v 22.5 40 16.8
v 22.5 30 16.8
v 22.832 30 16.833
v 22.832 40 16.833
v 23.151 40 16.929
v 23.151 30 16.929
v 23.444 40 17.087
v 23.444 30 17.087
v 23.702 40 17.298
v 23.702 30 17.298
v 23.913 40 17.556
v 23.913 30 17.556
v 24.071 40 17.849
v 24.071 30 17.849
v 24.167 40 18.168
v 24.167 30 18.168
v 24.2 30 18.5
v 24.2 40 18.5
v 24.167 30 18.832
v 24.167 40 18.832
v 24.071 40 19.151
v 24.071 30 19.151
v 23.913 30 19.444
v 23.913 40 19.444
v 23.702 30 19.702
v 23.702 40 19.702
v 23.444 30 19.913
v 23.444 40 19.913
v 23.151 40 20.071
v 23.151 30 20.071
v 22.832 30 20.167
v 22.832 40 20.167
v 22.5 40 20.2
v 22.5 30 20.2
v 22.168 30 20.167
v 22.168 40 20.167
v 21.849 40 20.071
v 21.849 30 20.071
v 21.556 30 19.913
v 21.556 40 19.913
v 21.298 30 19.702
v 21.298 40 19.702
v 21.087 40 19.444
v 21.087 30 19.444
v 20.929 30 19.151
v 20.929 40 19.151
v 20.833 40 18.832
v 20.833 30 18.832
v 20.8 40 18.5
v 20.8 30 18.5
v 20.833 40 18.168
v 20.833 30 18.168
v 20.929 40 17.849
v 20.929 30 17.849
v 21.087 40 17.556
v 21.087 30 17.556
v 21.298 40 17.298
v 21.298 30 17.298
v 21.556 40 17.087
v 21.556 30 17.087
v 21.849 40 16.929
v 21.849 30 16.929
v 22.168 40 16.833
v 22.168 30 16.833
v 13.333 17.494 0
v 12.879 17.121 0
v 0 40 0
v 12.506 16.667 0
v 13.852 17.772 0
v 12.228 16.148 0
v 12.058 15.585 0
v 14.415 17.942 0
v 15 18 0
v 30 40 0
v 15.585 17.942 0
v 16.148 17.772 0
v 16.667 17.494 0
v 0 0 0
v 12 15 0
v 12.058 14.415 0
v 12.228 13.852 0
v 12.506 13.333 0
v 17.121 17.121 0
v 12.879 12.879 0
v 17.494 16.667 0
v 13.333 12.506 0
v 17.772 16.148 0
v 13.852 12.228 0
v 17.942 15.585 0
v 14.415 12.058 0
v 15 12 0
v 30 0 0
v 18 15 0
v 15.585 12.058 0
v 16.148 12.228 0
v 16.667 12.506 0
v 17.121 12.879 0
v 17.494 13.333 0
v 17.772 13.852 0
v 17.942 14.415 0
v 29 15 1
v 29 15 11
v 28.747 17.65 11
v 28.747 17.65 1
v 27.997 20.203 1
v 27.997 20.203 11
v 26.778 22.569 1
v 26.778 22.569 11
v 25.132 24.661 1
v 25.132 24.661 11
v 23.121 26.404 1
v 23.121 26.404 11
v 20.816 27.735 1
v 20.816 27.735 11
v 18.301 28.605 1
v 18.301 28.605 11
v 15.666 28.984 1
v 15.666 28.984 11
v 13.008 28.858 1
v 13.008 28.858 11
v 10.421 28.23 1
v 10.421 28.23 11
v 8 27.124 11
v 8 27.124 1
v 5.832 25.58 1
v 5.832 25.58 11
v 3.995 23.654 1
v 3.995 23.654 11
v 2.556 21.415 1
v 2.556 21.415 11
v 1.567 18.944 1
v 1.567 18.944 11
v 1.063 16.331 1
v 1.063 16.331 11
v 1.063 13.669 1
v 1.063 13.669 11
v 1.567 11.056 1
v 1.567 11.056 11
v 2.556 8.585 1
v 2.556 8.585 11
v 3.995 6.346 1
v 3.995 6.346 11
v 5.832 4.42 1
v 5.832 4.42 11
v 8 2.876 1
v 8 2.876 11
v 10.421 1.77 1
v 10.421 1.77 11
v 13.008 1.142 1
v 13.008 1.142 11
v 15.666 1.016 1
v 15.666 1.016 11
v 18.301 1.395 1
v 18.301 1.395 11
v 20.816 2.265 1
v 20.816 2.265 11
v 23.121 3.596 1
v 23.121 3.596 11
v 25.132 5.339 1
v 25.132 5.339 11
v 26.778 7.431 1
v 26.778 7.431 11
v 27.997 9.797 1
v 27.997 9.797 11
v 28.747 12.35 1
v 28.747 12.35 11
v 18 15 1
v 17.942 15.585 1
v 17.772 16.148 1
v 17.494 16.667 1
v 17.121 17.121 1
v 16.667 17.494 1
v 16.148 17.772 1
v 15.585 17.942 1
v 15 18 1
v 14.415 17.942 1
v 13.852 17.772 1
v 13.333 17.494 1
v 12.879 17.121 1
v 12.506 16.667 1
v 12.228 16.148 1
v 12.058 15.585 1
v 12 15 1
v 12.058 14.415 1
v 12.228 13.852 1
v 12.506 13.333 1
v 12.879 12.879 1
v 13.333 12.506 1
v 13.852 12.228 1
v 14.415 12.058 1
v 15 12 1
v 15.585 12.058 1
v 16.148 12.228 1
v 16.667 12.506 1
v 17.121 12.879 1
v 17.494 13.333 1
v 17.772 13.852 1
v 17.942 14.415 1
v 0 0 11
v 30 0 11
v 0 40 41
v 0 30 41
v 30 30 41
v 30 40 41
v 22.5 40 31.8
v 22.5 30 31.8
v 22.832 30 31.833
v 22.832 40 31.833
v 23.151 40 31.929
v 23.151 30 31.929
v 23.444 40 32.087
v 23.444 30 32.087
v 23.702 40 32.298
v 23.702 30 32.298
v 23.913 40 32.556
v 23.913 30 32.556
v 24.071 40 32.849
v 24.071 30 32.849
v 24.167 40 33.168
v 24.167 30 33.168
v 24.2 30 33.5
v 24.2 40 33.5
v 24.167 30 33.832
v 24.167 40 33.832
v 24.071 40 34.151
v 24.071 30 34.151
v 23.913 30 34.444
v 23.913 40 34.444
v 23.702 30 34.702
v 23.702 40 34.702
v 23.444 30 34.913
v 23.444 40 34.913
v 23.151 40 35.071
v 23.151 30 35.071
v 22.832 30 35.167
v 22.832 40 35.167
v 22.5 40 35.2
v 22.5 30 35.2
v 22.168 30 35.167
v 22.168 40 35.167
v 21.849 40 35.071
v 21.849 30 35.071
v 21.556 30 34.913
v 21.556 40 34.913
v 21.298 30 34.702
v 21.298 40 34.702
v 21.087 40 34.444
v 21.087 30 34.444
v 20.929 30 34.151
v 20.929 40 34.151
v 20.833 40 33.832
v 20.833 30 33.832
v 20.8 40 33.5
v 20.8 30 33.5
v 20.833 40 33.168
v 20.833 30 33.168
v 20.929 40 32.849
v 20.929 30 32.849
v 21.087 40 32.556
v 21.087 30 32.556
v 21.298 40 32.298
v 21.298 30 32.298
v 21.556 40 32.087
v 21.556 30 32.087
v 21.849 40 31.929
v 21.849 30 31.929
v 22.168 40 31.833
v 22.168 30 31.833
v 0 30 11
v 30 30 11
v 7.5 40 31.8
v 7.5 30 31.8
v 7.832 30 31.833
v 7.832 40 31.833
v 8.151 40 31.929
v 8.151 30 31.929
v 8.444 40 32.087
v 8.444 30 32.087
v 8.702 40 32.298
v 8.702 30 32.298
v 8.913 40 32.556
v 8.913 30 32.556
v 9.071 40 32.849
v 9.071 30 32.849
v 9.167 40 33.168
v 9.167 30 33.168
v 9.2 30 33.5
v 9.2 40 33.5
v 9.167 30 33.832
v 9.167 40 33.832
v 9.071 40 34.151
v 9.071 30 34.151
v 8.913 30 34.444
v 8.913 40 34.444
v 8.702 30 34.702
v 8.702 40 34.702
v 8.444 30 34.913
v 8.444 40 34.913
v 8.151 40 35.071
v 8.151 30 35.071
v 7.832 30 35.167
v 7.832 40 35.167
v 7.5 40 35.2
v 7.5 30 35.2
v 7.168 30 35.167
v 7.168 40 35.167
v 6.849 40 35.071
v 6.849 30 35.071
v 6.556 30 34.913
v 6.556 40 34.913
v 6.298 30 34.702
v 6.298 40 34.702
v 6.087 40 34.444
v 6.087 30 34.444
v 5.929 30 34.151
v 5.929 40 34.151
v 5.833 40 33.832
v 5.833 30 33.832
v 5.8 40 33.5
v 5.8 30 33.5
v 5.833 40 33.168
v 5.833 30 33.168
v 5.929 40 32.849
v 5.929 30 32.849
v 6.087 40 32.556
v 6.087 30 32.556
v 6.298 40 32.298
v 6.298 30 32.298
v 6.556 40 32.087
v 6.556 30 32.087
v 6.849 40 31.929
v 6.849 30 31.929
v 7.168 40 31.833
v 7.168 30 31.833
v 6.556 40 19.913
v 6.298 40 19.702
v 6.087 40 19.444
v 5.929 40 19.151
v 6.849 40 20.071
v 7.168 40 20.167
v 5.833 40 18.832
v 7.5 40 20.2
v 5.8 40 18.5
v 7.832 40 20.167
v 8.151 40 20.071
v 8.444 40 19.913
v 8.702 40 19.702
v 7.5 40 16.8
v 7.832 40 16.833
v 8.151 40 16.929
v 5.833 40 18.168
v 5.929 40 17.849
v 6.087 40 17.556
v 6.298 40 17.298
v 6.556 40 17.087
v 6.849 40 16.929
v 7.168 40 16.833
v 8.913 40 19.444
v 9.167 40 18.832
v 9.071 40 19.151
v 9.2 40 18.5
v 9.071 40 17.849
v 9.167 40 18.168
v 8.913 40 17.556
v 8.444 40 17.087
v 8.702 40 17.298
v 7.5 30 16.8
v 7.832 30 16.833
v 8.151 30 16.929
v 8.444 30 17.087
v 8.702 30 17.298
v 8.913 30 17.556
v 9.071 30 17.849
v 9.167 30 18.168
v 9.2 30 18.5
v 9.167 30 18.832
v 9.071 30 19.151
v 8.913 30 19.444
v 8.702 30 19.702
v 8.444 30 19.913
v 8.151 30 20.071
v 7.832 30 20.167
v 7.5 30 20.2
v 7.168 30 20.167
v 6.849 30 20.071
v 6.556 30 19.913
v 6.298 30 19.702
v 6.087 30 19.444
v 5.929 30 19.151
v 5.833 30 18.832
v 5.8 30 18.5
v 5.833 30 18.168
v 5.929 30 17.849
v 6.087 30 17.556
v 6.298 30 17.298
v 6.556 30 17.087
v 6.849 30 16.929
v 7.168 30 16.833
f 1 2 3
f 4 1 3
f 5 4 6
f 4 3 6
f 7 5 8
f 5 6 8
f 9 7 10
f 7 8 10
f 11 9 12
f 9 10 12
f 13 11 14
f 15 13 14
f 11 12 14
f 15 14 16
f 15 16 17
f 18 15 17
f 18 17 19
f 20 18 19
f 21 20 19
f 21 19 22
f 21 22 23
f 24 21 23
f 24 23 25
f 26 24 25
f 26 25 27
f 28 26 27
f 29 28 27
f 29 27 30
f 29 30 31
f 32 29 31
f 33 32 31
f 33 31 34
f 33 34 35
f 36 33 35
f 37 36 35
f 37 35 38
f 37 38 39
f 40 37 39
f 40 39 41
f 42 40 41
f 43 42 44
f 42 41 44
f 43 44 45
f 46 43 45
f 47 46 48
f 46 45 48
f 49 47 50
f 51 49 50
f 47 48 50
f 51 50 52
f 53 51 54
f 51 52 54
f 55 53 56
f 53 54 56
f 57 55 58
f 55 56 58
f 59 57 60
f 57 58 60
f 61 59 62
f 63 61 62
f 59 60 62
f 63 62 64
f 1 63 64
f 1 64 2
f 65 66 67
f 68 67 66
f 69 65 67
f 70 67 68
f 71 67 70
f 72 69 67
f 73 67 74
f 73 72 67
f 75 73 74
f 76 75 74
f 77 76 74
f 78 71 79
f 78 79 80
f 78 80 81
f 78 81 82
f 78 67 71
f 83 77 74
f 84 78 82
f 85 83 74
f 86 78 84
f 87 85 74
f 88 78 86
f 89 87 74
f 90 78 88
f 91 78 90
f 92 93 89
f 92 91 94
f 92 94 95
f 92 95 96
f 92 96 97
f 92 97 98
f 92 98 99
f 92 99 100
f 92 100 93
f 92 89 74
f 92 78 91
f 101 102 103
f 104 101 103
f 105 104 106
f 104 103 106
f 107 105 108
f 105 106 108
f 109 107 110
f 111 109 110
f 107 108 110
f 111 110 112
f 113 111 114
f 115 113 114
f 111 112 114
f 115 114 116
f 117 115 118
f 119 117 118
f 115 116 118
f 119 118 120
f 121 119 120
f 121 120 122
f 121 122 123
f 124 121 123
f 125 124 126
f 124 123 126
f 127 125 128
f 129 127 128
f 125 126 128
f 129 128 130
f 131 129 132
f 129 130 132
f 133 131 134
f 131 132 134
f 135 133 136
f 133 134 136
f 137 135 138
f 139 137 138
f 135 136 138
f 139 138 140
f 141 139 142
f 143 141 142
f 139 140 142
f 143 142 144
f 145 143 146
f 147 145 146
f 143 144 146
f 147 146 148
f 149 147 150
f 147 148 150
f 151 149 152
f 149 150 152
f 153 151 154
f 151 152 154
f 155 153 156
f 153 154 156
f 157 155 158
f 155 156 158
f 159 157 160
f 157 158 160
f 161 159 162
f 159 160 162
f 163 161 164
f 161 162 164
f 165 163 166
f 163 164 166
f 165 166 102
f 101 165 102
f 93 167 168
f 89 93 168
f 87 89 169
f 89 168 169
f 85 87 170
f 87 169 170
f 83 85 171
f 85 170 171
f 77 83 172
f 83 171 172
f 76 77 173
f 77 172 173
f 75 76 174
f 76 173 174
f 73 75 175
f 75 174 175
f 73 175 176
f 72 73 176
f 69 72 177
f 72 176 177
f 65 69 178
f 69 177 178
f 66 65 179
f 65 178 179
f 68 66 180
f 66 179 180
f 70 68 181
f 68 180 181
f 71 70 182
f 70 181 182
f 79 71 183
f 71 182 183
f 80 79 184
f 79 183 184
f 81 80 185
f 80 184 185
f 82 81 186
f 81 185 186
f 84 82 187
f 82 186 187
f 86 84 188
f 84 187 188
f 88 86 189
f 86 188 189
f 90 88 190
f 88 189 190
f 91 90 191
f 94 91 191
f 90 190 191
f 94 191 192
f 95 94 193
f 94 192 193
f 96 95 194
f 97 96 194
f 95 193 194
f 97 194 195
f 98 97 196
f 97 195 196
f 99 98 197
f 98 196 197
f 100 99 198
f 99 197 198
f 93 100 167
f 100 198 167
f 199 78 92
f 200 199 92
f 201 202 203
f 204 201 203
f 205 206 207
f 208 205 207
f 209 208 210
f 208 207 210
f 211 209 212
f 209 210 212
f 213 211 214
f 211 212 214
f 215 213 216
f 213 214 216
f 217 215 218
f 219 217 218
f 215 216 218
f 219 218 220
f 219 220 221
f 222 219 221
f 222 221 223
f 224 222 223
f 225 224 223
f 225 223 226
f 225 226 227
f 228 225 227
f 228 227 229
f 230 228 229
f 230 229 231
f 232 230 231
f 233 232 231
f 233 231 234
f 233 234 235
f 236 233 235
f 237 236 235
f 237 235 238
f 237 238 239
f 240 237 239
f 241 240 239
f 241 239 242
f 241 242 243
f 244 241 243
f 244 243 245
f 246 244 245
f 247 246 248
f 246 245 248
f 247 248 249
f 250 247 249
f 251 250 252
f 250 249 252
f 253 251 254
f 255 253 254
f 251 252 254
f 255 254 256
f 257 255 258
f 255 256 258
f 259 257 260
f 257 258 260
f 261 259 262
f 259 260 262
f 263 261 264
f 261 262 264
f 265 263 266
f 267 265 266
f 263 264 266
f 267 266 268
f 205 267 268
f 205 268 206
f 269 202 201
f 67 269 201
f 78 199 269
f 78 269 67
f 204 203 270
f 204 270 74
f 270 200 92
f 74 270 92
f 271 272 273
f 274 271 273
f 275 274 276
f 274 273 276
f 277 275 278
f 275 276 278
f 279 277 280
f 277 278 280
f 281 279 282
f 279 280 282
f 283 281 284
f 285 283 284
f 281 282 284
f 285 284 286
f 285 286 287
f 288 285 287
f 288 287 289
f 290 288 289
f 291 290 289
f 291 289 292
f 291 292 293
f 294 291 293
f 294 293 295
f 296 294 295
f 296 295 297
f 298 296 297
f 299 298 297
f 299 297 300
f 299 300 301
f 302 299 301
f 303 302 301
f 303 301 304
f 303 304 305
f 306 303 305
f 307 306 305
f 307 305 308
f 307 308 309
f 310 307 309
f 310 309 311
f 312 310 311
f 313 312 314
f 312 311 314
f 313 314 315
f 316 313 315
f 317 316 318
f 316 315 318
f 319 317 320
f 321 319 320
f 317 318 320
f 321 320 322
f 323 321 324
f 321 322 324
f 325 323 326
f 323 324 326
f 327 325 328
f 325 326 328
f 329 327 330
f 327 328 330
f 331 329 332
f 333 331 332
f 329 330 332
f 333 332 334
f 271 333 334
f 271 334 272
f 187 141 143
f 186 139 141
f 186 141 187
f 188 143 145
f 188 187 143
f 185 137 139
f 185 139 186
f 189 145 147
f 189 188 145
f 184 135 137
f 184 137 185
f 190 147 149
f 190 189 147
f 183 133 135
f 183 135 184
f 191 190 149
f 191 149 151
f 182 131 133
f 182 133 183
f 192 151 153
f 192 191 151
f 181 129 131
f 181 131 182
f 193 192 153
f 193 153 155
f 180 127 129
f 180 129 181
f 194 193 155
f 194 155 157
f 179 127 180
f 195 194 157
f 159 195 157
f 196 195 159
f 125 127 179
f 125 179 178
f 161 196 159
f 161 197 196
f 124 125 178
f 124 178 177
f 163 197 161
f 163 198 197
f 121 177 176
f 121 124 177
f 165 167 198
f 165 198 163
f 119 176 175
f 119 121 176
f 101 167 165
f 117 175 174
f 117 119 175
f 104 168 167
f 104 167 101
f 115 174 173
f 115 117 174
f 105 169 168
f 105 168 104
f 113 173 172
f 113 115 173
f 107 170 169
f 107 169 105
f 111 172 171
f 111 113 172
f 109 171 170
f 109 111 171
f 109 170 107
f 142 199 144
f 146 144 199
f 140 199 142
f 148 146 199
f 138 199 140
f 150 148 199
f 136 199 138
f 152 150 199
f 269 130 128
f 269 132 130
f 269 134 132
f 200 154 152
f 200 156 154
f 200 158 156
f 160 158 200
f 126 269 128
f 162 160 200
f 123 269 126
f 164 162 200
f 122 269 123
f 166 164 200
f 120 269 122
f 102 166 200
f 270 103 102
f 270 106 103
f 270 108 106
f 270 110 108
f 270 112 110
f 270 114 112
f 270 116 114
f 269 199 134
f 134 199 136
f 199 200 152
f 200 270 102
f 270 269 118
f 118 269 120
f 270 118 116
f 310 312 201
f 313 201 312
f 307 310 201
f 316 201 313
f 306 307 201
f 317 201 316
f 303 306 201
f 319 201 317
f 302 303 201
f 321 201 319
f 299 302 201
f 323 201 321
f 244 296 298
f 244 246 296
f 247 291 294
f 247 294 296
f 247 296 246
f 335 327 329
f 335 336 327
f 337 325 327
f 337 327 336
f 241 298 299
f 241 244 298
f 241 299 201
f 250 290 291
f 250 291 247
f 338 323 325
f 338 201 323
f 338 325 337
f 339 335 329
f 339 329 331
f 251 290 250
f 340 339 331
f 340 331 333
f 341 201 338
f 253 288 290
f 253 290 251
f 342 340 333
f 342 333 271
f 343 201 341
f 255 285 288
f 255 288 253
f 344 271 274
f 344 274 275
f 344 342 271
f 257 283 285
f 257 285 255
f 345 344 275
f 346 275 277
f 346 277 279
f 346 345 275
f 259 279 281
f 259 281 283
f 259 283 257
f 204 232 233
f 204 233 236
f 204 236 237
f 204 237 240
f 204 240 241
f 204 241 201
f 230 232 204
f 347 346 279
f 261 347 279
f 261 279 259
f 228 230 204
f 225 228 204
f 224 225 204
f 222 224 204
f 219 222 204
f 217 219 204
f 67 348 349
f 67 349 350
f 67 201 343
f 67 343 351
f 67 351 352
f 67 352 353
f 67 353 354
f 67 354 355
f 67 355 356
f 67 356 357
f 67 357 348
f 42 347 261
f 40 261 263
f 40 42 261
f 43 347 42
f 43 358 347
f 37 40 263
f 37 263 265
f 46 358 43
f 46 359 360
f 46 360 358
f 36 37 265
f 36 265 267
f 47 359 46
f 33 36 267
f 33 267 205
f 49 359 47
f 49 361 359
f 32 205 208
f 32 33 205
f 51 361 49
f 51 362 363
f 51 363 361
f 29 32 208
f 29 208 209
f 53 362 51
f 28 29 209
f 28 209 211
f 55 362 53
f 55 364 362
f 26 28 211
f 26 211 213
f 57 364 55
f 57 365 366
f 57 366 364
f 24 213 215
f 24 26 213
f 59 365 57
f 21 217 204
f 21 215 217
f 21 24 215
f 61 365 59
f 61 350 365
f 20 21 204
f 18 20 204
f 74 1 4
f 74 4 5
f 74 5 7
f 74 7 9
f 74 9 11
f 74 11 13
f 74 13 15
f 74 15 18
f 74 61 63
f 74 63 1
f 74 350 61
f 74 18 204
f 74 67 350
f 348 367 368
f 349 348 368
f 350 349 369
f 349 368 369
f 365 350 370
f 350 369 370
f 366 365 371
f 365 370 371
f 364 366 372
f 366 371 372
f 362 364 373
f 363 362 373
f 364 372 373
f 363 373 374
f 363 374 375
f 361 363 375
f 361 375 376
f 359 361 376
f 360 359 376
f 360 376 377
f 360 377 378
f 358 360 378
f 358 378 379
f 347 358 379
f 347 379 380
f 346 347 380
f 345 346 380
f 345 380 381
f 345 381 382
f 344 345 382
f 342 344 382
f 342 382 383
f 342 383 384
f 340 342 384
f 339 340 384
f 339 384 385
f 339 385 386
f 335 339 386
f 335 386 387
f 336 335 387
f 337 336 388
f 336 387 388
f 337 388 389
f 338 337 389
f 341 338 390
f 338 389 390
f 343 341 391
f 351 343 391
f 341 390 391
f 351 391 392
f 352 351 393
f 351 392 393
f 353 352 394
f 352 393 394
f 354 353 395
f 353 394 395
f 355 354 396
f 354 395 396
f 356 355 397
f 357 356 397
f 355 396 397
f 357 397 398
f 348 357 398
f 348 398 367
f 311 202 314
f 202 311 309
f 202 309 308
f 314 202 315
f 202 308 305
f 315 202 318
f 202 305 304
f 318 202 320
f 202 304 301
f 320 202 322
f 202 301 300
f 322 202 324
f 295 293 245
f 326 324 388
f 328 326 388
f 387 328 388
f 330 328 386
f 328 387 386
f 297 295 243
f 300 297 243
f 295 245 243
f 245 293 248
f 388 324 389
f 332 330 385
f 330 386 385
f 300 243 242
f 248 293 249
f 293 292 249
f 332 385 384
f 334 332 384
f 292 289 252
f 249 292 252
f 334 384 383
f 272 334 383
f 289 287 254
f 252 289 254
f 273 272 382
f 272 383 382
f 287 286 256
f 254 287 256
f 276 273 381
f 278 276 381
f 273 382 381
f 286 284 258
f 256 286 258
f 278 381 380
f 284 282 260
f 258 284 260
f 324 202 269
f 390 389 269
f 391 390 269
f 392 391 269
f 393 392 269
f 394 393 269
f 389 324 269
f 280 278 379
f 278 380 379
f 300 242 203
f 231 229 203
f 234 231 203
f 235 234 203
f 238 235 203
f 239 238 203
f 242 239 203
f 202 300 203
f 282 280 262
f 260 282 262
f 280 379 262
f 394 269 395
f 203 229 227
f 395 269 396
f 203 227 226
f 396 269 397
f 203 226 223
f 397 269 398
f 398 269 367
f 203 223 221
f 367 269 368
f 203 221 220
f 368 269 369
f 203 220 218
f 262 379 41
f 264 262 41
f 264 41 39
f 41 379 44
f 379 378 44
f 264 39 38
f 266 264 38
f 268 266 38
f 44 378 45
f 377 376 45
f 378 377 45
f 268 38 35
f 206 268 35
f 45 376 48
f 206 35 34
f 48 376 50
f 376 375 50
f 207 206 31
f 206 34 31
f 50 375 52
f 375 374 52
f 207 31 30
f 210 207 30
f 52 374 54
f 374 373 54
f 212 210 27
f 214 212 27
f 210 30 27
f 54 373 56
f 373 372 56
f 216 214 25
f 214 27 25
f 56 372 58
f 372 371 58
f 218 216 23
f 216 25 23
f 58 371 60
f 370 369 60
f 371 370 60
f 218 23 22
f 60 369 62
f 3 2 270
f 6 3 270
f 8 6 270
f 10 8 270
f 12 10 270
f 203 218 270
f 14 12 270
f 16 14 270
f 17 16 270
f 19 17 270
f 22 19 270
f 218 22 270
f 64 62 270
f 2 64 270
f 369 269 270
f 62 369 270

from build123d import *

# Parameters (mm, degrees)
SKETCH1_W           = 30
SKETCH1_H           = 30
BOSS_EXTRUDE1_DEPTH = 11
SKETCH2_R           = 14
CUT_EXTRUDE1_DEPTH  = 10
SKETCH3_R           = 3
CUT_EXTRUDE2_DEPTH  = 1
SKETCH4_W           = 30
SKETCH4_H           = 41
BOSS_EXTRUDE2_DEPTH = 10
SKETCH5_R           = 1.7
CUT_EXTRUDE3_DEPTH  = 60


with BuildPart() as part:
    # Sketch1 → Boss-Extrude1 (new body)
    with BuildSketch(Plane.XY):
        with Locations((15, 15)):
            Rectangle(SKETCH1_W, SKETCH1_H)
    extrude(amount=BOSS_EXTRUDE1_DEPTH)

    # Sketch2 → Cut-Extrude1 (cut)
    with BuildSketch(Plane.XY.offset(11)):
        with Locations((15, 15)):
            Circle(SKETCH2_R)
    extrude(amount=-CUT_EXTRUDE1_DEPTH, mode=Mode.SUBTRACT)

    # Sketch3 → Cut-Extrude2 (cut)
    with BuildSketch(Plane.XY.offset(1)):
        with Locations((15, 15)):
            Circle(SKETCH3_R)
    extrude(amount=-CUT_EXTRUDE2_DEPTH, mode=Mode.SUBTRACT)

    # Sketch4 → Boss-Extrude2 (add)
    with BuildSketch(Plane(origin=(0, 30, 0), x_dir=(1, 0, 0), z_dir=(0, 1, 0))):
        with Locations((15, -20.5)):
            Rectangle(SKETCH4_W, SKETCH4_H)
    extrude(amount=BOSS_EXTRUDE2_DEPTH)

    # Sketch5 → Cut-Extrude3 (cut, through all)
    with BuildSketch(Plane.XZ.offset(-30)):
        with Locations(Location((7.5, 33.5, 0), (0, 0, 270))):
            Circle(SKETCH5_R)
        with Locations(Location((22.5, 33.5, 0), (0, 0, 270))):
            Circle(SKETCH5_R)
        with Locations(Location((7.5, 18.5, 0), (0, 0, 270))):
            Circle(SKETCH5_R)
        with Locations(Location((22.5, 18.5, 0), (0, 0, 270))):
            Circle(SKETCH5_R)
    extrude(amount=-CUT_EXTRUDE3_DEPTH, mode=Mode.SUBTRACT)


solid = part.part
